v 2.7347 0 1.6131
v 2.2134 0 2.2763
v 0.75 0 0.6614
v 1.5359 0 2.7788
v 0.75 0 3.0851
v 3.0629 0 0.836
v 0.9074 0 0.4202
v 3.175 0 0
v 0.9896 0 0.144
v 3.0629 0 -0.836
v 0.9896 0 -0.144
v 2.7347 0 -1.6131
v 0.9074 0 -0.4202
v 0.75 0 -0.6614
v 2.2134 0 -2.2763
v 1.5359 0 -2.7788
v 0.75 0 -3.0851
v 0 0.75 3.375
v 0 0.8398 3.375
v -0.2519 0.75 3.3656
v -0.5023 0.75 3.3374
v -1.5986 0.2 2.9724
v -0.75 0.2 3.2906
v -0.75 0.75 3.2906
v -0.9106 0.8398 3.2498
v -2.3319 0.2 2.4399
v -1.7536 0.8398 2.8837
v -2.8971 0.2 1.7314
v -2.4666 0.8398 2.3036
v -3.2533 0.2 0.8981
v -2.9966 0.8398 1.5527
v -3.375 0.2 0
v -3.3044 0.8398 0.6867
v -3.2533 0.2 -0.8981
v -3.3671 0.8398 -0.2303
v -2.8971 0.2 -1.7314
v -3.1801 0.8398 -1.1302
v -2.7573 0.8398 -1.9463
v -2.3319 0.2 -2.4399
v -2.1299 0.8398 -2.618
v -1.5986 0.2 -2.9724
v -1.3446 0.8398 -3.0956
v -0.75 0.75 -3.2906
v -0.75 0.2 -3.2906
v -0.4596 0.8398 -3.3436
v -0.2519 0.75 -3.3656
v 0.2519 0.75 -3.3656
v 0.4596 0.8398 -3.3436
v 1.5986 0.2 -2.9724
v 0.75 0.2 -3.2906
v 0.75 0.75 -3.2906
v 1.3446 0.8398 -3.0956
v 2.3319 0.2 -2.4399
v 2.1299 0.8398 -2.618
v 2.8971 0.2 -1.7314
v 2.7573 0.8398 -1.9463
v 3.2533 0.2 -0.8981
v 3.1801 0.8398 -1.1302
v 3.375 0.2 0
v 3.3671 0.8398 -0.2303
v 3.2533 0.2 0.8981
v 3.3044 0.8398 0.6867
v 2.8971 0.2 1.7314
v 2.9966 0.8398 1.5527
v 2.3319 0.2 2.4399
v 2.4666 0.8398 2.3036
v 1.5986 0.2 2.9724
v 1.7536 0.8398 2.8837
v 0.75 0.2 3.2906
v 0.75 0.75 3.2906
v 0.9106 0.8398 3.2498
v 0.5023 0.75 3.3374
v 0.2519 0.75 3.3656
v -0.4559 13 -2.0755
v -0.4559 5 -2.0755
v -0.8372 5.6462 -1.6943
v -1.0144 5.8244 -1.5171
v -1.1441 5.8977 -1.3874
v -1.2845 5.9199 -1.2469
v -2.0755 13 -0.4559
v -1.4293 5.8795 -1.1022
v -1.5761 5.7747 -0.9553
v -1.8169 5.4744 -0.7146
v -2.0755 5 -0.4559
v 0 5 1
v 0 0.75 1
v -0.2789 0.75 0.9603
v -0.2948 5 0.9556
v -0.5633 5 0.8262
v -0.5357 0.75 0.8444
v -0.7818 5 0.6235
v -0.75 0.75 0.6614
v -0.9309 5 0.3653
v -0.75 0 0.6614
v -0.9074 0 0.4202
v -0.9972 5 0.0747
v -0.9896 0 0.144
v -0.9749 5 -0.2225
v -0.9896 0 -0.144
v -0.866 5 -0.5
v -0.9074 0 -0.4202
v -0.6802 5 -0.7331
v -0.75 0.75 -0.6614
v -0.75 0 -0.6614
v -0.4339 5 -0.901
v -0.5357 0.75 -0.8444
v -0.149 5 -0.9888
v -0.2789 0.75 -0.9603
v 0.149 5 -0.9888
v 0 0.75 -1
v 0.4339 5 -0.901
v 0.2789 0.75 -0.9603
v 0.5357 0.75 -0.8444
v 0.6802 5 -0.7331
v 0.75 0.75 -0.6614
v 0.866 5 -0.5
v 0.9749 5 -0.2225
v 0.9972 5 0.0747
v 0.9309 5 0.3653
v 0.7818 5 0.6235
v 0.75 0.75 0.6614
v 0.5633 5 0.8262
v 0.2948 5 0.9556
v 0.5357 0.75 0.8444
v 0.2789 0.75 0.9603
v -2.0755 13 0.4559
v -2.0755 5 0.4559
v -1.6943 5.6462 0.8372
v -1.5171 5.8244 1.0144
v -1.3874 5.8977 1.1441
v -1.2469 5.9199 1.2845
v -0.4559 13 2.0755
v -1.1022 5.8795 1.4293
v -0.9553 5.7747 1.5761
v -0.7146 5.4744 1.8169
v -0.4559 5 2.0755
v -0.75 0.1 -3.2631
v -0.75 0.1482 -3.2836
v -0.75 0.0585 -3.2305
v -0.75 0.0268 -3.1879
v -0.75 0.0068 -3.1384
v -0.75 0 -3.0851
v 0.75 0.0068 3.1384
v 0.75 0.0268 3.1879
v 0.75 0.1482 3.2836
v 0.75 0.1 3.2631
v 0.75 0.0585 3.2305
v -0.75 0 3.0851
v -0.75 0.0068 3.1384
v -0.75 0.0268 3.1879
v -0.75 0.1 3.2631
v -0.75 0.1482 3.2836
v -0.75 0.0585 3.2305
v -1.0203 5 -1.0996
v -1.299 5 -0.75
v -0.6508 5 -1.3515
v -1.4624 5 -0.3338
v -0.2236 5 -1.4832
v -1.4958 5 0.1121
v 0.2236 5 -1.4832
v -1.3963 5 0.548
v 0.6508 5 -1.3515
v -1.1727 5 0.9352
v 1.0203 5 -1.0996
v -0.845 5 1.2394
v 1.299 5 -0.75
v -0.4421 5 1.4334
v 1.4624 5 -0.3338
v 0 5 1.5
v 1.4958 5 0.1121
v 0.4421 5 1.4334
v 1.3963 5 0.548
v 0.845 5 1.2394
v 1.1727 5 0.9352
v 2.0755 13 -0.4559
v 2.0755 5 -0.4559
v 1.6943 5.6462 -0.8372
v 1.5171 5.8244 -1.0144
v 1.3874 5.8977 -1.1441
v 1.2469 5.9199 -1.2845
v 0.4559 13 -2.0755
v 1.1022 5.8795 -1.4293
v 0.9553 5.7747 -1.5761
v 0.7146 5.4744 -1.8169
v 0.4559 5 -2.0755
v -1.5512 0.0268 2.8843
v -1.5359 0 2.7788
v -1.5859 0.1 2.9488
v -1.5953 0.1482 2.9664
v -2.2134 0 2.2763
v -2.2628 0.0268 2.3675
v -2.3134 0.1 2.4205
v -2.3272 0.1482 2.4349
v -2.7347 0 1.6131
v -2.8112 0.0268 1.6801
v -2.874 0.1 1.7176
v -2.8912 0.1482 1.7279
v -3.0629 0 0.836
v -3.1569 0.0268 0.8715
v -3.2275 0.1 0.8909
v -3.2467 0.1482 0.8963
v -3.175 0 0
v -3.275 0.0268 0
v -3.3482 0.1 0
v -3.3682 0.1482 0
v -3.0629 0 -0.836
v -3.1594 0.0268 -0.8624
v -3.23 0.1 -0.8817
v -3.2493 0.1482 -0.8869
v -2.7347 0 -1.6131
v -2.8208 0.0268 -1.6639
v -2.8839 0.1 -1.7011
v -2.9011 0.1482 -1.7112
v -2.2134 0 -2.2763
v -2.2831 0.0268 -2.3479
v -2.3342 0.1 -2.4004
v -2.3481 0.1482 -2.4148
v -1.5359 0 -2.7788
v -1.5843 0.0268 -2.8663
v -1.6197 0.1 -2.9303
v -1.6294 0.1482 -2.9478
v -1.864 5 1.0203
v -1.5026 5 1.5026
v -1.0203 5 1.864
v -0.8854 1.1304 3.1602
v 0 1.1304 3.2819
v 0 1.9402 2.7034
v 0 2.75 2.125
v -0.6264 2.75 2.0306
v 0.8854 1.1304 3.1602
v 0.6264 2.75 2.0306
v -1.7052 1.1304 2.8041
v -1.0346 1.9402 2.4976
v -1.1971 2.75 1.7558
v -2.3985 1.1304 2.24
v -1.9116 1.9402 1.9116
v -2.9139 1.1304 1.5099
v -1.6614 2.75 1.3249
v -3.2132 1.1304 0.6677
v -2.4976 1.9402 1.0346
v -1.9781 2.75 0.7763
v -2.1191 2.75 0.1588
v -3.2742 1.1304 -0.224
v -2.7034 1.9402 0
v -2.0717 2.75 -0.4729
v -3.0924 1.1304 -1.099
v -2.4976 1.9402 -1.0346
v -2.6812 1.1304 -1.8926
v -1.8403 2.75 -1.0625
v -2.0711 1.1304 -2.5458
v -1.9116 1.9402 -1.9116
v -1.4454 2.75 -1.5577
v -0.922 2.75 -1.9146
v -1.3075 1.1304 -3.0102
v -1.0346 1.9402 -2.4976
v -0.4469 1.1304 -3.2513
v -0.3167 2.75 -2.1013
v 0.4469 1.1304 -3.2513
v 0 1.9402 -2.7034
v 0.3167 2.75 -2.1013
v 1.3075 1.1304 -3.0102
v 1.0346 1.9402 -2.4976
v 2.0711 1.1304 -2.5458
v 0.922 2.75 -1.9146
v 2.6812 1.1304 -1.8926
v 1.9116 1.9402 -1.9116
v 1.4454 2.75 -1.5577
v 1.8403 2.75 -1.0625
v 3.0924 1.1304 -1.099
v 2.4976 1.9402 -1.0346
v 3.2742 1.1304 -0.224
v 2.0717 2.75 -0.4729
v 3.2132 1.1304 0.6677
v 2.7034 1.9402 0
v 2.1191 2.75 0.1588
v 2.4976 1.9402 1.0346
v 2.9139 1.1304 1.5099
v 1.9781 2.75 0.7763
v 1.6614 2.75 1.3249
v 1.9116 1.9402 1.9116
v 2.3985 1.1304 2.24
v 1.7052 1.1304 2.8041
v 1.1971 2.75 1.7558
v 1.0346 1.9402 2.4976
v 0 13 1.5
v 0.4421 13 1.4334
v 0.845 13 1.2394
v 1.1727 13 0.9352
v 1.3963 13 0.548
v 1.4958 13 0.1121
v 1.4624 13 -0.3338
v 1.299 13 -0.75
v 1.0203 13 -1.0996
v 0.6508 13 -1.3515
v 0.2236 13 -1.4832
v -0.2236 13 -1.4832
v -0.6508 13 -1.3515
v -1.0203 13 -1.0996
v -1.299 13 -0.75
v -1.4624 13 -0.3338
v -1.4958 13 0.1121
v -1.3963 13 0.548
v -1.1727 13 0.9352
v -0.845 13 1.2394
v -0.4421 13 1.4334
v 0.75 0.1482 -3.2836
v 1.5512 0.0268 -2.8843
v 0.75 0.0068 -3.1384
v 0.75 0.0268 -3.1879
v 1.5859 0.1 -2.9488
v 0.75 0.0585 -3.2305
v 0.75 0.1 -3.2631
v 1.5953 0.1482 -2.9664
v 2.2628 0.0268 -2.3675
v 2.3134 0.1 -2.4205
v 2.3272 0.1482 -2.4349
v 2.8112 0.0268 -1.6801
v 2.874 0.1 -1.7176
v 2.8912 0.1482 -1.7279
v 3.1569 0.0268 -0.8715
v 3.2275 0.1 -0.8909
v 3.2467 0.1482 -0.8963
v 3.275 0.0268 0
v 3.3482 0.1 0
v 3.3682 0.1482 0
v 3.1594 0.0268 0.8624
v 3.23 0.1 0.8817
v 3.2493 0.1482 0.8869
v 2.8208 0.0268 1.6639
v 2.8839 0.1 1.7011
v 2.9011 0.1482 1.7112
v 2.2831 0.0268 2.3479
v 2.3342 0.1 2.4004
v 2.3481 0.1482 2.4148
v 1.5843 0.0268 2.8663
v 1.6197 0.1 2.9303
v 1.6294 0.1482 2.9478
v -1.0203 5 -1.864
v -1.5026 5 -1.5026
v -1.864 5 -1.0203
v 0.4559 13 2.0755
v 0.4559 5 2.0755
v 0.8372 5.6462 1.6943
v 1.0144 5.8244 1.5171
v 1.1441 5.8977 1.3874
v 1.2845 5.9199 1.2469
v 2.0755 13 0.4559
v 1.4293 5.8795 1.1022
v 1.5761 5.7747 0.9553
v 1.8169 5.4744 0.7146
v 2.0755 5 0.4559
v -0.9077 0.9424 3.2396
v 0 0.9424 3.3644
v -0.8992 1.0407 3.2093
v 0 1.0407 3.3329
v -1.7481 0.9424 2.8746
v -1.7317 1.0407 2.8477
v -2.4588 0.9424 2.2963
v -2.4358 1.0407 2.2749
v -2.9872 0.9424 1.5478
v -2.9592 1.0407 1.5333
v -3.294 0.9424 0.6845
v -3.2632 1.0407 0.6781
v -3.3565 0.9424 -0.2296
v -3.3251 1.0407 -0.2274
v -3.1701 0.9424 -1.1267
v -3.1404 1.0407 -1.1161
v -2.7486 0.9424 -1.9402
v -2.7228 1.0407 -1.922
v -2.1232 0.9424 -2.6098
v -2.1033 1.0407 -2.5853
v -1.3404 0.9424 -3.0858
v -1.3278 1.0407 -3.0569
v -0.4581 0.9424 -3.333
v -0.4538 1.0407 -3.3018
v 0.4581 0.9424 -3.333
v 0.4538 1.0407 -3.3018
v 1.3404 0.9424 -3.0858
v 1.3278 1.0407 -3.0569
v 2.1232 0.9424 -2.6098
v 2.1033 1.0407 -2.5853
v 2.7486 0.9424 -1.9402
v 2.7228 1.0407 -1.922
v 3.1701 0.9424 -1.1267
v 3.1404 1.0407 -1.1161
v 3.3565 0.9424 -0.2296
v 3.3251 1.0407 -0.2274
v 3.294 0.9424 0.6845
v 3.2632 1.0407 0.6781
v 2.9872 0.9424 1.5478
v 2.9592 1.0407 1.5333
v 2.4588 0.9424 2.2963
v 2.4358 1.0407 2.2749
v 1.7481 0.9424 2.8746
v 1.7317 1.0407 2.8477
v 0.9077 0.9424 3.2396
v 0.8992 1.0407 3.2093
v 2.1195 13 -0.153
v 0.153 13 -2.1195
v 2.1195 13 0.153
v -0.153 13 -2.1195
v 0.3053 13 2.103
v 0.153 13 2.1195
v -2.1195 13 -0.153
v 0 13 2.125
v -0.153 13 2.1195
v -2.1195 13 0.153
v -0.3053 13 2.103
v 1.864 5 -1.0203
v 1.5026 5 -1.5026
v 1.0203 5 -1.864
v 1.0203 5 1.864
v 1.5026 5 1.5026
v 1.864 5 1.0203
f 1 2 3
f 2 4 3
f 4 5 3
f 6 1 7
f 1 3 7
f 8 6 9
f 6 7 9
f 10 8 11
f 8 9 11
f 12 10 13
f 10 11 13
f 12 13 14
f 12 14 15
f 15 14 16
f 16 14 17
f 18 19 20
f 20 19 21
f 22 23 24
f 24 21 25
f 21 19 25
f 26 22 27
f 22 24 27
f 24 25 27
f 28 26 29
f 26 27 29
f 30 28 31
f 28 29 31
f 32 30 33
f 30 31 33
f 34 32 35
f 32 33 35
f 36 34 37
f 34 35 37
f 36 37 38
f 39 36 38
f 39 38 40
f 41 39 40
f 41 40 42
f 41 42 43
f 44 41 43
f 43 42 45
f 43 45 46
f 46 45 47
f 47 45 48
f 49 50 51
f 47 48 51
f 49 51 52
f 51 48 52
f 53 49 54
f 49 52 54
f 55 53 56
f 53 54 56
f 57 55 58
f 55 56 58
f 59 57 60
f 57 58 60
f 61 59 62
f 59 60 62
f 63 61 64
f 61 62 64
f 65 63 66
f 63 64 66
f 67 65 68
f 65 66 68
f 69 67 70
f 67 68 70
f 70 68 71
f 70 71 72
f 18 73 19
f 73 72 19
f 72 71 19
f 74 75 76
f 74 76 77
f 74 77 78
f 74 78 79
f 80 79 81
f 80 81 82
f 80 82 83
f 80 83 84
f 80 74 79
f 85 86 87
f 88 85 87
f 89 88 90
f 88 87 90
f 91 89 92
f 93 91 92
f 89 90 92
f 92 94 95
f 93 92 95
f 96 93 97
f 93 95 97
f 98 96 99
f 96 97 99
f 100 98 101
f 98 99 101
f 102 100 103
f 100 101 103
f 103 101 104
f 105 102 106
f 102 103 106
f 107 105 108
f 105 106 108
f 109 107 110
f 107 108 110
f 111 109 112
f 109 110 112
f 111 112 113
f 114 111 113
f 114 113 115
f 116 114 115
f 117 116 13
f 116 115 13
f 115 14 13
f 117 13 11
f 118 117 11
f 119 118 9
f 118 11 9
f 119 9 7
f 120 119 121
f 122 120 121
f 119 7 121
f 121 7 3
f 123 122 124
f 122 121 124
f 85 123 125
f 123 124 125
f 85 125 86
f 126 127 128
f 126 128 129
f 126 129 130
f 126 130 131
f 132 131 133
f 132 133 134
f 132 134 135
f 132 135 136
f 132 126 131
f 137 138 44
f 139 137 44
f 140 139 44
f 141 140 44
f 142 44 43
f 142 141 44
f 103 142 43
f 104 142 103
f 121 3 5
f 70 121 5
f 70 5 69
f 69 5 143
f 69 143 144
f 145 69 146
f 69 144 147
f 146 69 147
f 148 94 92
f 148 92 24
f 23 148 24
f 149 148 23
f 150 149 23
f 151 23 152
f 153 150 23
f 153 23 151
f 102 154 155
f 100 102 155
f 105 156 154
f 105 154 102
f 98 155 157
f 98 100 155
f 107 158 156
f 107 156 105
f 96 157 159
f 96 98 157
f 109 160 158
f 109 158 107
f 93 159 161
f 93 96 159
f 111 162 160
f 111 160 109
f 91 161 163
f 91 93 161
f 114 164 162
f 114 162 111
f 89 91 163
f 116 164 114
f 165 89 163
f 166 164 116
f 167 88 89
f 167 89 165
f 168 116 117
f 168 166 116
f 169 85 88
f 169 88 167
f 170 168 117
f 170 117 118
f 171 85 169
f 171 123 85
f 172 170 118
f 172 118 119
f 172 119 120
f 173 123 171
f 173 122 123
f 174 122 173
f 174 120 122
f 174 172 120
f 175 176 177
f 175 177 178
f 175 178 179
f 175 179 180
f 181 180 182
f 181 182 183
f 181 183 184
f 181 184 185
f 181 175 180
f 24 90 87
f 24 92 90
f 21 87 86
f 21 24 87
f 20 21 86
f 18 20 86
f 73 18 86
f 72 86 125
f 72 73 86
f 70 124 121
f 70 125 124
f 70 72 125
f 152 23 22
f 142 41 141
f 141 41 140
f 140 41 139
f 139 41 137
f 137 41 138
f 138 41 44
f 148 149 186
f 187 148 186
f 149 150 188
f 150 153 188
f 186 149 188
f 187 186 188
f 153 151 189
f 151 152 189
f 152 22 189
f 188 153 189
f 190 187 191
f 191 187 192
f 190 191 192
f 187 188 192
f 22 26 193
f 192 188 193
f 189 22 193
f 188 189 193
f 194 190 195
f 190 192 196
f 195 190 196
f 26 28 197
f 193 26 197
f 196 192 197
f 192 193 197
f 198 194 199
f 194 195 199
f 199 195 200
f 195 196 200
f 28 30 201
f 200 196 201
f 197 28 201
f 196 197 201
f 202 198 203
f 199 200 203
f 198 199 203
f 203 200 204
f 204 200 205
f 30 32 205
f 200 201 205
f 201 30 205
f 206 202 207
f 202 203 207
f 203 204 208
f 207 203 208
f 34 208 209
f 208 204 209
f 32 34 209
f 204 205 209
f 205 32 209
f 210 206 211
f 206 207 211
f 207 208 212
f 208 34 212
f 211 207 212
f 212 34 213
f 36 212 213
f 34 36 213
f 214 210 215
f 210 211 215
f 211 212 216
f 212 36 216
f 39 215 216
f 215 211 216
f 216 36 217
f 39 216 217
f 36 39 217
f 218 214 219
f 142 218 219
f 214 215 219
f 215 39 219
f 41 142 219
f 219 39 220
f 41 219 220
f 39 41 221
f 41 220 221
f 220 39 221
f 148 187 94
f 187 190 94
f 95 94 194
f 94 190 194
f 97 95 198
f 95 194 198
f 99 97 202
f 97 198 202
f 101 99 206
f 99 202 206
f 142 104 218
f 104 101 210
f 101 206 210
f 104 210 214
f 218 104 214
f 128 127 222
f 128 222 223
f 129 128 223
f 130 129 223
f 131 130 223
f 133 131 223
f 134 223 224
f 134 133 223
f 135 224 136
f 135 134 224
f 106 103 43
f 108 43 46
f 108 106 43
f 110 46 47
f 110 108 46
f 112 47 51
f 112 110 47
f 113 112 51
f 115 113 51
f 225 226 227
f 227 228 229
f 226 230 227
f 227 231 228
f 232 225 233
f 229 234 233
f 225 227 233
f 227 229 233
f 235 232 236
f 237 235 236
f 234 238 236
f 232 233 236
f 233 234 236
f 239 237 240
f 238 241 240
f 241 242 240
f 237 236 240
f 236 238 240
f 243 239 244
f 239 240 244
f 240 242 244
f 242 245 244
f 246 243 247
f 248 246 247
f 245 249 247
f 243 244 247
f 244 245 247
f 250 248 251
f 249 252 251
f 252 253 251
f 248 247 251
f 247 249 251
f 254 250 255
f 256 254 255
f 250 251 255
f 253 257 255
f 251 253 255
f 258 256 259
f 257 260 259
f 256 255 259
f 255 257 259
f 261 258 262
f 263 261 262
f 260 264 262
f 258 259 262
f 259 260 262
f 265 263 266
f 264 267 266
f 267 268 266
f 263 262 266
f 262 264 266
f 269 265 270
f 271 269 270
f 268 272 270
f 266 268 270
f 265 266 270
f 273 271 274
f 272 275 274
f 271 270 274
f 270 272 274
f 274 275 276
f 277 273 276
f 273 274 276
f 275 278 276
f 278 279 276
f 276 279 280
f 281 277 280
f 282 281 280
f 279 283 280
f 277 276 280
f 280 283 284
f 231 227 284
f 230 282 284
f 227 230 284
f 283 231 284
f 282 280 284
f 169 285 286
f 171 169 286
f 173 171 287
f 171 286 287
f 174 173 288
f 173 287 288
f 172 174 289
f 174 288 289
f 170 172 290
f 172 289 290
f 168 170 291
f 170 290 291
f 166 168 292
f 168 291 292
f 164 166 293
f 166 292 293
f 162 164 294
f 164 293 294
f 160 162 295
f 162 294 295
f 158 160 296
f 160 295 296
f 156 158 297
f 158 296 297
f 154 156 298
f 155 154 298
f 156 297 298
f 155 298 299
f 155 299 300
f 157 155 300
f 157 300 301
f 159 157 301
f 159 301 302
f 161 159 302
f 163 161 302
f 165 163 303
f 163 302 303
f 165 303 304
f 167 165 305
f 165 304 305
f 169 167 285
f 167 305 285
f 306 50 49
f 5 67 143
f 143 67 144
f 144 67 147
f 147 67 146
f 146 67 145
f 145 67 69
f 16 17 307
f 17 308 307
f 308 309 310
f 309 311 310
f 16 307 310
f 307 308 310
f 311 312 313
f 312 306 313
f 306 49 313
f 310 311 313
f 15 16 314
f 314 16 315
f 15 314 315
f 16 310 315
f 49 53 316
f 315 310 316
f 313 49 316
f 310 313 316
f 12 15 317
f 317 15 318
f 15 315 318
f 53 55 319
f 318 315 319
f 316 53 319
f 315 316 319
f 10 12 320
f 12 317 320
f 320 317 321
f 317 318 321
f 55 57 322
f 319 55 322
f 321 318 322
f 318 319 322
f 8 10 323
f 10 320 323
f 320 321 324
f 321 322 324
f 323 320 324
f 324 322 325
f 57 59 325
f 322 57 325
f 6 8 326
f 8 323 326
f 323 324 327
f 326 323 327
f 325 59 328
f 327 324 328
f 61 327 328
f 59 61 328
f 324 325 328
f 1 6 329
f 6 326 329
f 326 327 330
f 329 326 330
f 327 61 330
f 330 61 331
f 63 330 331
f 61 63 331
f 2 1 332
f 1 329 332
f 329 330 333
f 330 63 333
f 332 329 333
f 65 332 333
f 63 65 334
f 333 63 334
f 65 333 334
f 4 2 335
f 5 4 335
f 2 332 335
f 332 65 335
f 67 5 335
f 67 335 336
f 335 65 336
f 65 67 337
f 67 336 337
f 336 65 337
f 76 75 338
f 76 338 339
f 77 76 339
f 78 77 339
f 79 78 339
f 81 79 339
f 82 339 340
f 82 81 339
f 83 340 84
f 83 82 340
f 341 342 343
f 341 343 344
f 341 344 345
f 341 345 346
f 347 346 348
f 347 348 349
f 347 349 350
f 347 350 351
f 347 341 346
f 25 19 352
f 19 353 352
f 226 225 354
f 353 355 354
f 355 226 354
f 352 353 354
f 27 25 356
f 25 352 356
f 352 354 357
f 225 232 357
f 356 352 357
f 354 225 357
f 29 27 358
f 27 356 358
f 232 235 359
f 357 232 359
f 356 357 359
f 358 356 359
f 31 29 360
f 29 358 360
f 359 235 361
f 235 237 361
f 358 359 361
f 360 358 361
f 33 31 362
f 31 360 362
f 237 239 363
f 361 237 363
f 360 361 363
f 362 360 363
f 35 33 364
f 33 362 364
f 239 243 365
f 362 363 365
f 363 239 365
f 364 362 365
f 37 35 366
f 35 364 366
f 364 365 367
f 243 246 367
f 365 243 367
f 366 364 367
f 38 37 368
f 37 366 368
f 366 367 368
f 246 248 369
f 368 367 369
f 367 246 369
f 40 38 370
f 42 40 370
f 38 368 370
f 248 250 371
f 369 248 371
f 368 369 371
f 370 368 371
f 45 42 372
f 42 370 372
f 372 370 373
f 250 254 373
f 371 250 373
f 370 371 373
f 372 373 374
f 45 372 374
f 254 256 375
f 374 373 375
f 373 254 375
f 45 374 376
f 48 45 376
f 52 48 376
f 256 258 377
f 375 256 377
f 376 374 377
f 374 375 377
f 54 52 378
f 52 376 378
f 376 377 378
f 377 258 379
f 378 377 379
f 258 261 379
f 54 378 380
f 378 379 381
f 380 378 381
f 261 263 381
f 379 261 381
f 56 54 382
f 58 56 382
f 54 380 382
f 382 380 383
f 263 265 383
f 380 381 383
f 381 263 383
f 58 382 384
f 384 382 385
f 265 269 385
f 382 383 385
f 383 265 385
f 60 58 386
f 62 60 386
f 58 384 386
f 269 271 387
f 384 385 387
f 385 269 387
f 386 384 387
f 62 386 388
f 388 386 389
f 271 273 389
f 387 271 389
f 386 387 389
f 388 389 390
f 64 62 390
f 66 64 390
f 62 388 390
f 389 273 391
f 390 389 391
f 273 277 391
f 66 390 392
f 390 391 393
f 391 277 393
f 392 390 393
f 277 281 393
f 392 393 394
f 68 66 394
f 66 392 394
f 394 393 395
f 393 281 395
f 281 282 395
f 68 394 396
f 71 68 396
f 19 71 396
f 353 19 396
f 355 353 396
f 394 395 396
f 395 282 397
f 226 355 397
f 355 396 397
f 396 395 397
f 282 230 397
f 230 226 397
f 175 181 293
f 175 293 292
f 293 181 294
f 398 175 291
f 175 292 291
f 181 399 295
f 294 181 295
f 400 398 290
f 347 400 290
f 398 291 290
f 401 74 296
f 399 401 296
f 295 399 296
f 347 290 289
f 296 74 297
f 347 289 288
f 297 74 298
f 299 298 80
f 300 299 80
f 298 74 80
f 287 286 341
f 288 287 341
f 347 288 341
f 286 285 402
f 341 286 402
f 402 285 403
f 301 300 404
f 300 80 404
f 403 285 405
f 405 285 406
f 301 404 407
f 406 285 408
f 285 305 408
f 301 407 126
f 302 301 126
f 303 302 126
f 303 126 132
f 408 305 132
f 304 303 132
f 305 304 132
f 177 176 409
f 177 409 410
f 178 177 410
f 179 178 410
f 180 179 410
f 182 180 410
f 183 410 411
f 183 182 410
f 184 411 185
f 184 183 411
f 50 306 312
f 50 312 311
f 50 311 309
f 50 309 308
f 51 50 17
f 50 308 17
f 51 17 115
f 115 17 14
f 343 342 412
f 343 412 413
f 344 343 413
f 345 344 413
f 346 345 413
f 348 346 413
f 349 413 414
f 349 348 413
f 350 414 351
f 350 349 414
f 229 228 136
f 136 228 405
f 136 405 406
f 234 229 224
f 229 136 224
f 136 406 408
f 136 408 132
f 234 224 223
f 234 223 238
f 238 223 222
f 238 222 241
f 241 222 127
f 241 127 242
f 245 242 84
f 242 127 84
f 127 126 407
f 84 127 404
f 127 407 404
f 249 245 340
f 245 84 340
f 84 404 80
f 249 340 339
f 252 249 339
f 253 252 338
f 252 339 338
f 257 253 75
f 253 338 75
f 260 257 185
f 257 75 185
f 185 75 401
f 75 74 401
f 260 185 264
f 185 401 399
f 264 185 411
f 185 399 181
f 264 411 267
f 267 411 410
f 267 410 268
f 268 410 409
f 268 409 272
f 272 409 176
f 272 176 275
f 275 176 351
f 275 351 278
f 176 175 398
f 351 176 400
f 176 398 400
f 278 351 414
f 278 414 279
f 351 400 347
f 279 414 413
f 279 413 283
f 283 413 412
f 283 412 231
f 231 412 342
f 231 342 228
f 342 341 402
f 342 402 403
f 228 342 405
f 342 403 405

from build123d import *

# Parameters (mm, degrees)
SKETCH2_OUTSIDE_W  = 11.976
SKETCH2_OUTSIDE_H  = 11.976
CUT_EXTRUDE1_DEPTH = 8
SKETCH4_R          = 1.5
CUT_EXTRUDE2_DEPTH = 8
SKETCH5_W          = 1.5
SKETCH5_H          = 6.75
CUT_EXTRUDE3_DEPTH = 0.75


with BuildPart() as part:
    # Sketch1 → Revolve1 (revolve)
    with BuildSketch(Plane.XY, mode=Mode.PRIVATE) as revolve1_sk:
        with BuildLine():
            Line((1, 0), (3.175, 0))
            ThreePointArc((3.175, 0), (3.316421356, 0.058578644), (3.375, 0.2))
            Line((3.375, 0.2), (3.375, 0.839767473))
            ThreePointArc((3.375, 0.839767473), (3.351147754, 0.992356189), (3.281866736, 1.13038657))
            Line((3.281866736, 1.13038657), (2.125, 2.75))
            Line((2.125, 2.75), (2.125, 9.05))
            Line((2.125, 9.05), (2.125, 13))
            Line((2.125, 13), (1, 13))
            Line((1, 13), (1, 0))
        make_face()
    revolve(revolve1_sk.sketch.rotate(Axis((0, 13, 0), (0, -1, 0)), 90), axis=Axis((0, 13, 0), (0, -1, 0)))

    # Sketch2 outside → Cut-Extrude1 (cut)
    with BuildSketch(Plane(origin=(0, 13, 0), x_dir=(1, 0, 0), z_dir=(0, 1, 0))):
        Rectangle(SKETCH2_OUTSIDE_W, SKETCH2_OUTSIDE_H)
        Polygon((0, 2.531442277), (-2.531442277, 0), (0, -2.531442277), (2.531442277, 0), align=None, mode=Mode.SUBTRACT)
    extrude(amount=-CUT_EXTRUDE1_DEPTH, mode=Mode.SUBTRACT)

    # Boss-Extrude1 cone 1 section (through the dimple's axis) → Boss-Extrude1 (revolve)
    with BuildSketch(Plane(origin=(0, 5, 0), x_dir=(0, 0, -1), z_dir=(1, 0, 0))):
        Polygon((0, 0), (2.125, 0), (0, 5.838389516), align=None)
    revolve(axis=Axis((0, 5, 0), (0, 1, 0)))

    # Sketch4 → Cut-Extrude2 (cut)
    with BuildSketch(Plane(origin=(0, 13, 0), x_dir=(1, 0, 0), z_dir=(0, 1, 0))):
        with Locations(Location((0, 0, 0), (0, 0, 270))):
            Circle(SKETCH4_R)
    extrude(amount=-CUT_EXTRUDE2_DEPTH, mode=Mode.SUBTRACT)

    # Sketch5 → Cut-Extrude3 (cut)
    with BuildSketch(Plane.XZ):
        Rectangle(SKETCH5_W, SKETCH5_H)
    extrude(amount=-CUT_EXTRUDE3_DEPTH, mode=Mode.SUBTRACT)


solid = part.part
